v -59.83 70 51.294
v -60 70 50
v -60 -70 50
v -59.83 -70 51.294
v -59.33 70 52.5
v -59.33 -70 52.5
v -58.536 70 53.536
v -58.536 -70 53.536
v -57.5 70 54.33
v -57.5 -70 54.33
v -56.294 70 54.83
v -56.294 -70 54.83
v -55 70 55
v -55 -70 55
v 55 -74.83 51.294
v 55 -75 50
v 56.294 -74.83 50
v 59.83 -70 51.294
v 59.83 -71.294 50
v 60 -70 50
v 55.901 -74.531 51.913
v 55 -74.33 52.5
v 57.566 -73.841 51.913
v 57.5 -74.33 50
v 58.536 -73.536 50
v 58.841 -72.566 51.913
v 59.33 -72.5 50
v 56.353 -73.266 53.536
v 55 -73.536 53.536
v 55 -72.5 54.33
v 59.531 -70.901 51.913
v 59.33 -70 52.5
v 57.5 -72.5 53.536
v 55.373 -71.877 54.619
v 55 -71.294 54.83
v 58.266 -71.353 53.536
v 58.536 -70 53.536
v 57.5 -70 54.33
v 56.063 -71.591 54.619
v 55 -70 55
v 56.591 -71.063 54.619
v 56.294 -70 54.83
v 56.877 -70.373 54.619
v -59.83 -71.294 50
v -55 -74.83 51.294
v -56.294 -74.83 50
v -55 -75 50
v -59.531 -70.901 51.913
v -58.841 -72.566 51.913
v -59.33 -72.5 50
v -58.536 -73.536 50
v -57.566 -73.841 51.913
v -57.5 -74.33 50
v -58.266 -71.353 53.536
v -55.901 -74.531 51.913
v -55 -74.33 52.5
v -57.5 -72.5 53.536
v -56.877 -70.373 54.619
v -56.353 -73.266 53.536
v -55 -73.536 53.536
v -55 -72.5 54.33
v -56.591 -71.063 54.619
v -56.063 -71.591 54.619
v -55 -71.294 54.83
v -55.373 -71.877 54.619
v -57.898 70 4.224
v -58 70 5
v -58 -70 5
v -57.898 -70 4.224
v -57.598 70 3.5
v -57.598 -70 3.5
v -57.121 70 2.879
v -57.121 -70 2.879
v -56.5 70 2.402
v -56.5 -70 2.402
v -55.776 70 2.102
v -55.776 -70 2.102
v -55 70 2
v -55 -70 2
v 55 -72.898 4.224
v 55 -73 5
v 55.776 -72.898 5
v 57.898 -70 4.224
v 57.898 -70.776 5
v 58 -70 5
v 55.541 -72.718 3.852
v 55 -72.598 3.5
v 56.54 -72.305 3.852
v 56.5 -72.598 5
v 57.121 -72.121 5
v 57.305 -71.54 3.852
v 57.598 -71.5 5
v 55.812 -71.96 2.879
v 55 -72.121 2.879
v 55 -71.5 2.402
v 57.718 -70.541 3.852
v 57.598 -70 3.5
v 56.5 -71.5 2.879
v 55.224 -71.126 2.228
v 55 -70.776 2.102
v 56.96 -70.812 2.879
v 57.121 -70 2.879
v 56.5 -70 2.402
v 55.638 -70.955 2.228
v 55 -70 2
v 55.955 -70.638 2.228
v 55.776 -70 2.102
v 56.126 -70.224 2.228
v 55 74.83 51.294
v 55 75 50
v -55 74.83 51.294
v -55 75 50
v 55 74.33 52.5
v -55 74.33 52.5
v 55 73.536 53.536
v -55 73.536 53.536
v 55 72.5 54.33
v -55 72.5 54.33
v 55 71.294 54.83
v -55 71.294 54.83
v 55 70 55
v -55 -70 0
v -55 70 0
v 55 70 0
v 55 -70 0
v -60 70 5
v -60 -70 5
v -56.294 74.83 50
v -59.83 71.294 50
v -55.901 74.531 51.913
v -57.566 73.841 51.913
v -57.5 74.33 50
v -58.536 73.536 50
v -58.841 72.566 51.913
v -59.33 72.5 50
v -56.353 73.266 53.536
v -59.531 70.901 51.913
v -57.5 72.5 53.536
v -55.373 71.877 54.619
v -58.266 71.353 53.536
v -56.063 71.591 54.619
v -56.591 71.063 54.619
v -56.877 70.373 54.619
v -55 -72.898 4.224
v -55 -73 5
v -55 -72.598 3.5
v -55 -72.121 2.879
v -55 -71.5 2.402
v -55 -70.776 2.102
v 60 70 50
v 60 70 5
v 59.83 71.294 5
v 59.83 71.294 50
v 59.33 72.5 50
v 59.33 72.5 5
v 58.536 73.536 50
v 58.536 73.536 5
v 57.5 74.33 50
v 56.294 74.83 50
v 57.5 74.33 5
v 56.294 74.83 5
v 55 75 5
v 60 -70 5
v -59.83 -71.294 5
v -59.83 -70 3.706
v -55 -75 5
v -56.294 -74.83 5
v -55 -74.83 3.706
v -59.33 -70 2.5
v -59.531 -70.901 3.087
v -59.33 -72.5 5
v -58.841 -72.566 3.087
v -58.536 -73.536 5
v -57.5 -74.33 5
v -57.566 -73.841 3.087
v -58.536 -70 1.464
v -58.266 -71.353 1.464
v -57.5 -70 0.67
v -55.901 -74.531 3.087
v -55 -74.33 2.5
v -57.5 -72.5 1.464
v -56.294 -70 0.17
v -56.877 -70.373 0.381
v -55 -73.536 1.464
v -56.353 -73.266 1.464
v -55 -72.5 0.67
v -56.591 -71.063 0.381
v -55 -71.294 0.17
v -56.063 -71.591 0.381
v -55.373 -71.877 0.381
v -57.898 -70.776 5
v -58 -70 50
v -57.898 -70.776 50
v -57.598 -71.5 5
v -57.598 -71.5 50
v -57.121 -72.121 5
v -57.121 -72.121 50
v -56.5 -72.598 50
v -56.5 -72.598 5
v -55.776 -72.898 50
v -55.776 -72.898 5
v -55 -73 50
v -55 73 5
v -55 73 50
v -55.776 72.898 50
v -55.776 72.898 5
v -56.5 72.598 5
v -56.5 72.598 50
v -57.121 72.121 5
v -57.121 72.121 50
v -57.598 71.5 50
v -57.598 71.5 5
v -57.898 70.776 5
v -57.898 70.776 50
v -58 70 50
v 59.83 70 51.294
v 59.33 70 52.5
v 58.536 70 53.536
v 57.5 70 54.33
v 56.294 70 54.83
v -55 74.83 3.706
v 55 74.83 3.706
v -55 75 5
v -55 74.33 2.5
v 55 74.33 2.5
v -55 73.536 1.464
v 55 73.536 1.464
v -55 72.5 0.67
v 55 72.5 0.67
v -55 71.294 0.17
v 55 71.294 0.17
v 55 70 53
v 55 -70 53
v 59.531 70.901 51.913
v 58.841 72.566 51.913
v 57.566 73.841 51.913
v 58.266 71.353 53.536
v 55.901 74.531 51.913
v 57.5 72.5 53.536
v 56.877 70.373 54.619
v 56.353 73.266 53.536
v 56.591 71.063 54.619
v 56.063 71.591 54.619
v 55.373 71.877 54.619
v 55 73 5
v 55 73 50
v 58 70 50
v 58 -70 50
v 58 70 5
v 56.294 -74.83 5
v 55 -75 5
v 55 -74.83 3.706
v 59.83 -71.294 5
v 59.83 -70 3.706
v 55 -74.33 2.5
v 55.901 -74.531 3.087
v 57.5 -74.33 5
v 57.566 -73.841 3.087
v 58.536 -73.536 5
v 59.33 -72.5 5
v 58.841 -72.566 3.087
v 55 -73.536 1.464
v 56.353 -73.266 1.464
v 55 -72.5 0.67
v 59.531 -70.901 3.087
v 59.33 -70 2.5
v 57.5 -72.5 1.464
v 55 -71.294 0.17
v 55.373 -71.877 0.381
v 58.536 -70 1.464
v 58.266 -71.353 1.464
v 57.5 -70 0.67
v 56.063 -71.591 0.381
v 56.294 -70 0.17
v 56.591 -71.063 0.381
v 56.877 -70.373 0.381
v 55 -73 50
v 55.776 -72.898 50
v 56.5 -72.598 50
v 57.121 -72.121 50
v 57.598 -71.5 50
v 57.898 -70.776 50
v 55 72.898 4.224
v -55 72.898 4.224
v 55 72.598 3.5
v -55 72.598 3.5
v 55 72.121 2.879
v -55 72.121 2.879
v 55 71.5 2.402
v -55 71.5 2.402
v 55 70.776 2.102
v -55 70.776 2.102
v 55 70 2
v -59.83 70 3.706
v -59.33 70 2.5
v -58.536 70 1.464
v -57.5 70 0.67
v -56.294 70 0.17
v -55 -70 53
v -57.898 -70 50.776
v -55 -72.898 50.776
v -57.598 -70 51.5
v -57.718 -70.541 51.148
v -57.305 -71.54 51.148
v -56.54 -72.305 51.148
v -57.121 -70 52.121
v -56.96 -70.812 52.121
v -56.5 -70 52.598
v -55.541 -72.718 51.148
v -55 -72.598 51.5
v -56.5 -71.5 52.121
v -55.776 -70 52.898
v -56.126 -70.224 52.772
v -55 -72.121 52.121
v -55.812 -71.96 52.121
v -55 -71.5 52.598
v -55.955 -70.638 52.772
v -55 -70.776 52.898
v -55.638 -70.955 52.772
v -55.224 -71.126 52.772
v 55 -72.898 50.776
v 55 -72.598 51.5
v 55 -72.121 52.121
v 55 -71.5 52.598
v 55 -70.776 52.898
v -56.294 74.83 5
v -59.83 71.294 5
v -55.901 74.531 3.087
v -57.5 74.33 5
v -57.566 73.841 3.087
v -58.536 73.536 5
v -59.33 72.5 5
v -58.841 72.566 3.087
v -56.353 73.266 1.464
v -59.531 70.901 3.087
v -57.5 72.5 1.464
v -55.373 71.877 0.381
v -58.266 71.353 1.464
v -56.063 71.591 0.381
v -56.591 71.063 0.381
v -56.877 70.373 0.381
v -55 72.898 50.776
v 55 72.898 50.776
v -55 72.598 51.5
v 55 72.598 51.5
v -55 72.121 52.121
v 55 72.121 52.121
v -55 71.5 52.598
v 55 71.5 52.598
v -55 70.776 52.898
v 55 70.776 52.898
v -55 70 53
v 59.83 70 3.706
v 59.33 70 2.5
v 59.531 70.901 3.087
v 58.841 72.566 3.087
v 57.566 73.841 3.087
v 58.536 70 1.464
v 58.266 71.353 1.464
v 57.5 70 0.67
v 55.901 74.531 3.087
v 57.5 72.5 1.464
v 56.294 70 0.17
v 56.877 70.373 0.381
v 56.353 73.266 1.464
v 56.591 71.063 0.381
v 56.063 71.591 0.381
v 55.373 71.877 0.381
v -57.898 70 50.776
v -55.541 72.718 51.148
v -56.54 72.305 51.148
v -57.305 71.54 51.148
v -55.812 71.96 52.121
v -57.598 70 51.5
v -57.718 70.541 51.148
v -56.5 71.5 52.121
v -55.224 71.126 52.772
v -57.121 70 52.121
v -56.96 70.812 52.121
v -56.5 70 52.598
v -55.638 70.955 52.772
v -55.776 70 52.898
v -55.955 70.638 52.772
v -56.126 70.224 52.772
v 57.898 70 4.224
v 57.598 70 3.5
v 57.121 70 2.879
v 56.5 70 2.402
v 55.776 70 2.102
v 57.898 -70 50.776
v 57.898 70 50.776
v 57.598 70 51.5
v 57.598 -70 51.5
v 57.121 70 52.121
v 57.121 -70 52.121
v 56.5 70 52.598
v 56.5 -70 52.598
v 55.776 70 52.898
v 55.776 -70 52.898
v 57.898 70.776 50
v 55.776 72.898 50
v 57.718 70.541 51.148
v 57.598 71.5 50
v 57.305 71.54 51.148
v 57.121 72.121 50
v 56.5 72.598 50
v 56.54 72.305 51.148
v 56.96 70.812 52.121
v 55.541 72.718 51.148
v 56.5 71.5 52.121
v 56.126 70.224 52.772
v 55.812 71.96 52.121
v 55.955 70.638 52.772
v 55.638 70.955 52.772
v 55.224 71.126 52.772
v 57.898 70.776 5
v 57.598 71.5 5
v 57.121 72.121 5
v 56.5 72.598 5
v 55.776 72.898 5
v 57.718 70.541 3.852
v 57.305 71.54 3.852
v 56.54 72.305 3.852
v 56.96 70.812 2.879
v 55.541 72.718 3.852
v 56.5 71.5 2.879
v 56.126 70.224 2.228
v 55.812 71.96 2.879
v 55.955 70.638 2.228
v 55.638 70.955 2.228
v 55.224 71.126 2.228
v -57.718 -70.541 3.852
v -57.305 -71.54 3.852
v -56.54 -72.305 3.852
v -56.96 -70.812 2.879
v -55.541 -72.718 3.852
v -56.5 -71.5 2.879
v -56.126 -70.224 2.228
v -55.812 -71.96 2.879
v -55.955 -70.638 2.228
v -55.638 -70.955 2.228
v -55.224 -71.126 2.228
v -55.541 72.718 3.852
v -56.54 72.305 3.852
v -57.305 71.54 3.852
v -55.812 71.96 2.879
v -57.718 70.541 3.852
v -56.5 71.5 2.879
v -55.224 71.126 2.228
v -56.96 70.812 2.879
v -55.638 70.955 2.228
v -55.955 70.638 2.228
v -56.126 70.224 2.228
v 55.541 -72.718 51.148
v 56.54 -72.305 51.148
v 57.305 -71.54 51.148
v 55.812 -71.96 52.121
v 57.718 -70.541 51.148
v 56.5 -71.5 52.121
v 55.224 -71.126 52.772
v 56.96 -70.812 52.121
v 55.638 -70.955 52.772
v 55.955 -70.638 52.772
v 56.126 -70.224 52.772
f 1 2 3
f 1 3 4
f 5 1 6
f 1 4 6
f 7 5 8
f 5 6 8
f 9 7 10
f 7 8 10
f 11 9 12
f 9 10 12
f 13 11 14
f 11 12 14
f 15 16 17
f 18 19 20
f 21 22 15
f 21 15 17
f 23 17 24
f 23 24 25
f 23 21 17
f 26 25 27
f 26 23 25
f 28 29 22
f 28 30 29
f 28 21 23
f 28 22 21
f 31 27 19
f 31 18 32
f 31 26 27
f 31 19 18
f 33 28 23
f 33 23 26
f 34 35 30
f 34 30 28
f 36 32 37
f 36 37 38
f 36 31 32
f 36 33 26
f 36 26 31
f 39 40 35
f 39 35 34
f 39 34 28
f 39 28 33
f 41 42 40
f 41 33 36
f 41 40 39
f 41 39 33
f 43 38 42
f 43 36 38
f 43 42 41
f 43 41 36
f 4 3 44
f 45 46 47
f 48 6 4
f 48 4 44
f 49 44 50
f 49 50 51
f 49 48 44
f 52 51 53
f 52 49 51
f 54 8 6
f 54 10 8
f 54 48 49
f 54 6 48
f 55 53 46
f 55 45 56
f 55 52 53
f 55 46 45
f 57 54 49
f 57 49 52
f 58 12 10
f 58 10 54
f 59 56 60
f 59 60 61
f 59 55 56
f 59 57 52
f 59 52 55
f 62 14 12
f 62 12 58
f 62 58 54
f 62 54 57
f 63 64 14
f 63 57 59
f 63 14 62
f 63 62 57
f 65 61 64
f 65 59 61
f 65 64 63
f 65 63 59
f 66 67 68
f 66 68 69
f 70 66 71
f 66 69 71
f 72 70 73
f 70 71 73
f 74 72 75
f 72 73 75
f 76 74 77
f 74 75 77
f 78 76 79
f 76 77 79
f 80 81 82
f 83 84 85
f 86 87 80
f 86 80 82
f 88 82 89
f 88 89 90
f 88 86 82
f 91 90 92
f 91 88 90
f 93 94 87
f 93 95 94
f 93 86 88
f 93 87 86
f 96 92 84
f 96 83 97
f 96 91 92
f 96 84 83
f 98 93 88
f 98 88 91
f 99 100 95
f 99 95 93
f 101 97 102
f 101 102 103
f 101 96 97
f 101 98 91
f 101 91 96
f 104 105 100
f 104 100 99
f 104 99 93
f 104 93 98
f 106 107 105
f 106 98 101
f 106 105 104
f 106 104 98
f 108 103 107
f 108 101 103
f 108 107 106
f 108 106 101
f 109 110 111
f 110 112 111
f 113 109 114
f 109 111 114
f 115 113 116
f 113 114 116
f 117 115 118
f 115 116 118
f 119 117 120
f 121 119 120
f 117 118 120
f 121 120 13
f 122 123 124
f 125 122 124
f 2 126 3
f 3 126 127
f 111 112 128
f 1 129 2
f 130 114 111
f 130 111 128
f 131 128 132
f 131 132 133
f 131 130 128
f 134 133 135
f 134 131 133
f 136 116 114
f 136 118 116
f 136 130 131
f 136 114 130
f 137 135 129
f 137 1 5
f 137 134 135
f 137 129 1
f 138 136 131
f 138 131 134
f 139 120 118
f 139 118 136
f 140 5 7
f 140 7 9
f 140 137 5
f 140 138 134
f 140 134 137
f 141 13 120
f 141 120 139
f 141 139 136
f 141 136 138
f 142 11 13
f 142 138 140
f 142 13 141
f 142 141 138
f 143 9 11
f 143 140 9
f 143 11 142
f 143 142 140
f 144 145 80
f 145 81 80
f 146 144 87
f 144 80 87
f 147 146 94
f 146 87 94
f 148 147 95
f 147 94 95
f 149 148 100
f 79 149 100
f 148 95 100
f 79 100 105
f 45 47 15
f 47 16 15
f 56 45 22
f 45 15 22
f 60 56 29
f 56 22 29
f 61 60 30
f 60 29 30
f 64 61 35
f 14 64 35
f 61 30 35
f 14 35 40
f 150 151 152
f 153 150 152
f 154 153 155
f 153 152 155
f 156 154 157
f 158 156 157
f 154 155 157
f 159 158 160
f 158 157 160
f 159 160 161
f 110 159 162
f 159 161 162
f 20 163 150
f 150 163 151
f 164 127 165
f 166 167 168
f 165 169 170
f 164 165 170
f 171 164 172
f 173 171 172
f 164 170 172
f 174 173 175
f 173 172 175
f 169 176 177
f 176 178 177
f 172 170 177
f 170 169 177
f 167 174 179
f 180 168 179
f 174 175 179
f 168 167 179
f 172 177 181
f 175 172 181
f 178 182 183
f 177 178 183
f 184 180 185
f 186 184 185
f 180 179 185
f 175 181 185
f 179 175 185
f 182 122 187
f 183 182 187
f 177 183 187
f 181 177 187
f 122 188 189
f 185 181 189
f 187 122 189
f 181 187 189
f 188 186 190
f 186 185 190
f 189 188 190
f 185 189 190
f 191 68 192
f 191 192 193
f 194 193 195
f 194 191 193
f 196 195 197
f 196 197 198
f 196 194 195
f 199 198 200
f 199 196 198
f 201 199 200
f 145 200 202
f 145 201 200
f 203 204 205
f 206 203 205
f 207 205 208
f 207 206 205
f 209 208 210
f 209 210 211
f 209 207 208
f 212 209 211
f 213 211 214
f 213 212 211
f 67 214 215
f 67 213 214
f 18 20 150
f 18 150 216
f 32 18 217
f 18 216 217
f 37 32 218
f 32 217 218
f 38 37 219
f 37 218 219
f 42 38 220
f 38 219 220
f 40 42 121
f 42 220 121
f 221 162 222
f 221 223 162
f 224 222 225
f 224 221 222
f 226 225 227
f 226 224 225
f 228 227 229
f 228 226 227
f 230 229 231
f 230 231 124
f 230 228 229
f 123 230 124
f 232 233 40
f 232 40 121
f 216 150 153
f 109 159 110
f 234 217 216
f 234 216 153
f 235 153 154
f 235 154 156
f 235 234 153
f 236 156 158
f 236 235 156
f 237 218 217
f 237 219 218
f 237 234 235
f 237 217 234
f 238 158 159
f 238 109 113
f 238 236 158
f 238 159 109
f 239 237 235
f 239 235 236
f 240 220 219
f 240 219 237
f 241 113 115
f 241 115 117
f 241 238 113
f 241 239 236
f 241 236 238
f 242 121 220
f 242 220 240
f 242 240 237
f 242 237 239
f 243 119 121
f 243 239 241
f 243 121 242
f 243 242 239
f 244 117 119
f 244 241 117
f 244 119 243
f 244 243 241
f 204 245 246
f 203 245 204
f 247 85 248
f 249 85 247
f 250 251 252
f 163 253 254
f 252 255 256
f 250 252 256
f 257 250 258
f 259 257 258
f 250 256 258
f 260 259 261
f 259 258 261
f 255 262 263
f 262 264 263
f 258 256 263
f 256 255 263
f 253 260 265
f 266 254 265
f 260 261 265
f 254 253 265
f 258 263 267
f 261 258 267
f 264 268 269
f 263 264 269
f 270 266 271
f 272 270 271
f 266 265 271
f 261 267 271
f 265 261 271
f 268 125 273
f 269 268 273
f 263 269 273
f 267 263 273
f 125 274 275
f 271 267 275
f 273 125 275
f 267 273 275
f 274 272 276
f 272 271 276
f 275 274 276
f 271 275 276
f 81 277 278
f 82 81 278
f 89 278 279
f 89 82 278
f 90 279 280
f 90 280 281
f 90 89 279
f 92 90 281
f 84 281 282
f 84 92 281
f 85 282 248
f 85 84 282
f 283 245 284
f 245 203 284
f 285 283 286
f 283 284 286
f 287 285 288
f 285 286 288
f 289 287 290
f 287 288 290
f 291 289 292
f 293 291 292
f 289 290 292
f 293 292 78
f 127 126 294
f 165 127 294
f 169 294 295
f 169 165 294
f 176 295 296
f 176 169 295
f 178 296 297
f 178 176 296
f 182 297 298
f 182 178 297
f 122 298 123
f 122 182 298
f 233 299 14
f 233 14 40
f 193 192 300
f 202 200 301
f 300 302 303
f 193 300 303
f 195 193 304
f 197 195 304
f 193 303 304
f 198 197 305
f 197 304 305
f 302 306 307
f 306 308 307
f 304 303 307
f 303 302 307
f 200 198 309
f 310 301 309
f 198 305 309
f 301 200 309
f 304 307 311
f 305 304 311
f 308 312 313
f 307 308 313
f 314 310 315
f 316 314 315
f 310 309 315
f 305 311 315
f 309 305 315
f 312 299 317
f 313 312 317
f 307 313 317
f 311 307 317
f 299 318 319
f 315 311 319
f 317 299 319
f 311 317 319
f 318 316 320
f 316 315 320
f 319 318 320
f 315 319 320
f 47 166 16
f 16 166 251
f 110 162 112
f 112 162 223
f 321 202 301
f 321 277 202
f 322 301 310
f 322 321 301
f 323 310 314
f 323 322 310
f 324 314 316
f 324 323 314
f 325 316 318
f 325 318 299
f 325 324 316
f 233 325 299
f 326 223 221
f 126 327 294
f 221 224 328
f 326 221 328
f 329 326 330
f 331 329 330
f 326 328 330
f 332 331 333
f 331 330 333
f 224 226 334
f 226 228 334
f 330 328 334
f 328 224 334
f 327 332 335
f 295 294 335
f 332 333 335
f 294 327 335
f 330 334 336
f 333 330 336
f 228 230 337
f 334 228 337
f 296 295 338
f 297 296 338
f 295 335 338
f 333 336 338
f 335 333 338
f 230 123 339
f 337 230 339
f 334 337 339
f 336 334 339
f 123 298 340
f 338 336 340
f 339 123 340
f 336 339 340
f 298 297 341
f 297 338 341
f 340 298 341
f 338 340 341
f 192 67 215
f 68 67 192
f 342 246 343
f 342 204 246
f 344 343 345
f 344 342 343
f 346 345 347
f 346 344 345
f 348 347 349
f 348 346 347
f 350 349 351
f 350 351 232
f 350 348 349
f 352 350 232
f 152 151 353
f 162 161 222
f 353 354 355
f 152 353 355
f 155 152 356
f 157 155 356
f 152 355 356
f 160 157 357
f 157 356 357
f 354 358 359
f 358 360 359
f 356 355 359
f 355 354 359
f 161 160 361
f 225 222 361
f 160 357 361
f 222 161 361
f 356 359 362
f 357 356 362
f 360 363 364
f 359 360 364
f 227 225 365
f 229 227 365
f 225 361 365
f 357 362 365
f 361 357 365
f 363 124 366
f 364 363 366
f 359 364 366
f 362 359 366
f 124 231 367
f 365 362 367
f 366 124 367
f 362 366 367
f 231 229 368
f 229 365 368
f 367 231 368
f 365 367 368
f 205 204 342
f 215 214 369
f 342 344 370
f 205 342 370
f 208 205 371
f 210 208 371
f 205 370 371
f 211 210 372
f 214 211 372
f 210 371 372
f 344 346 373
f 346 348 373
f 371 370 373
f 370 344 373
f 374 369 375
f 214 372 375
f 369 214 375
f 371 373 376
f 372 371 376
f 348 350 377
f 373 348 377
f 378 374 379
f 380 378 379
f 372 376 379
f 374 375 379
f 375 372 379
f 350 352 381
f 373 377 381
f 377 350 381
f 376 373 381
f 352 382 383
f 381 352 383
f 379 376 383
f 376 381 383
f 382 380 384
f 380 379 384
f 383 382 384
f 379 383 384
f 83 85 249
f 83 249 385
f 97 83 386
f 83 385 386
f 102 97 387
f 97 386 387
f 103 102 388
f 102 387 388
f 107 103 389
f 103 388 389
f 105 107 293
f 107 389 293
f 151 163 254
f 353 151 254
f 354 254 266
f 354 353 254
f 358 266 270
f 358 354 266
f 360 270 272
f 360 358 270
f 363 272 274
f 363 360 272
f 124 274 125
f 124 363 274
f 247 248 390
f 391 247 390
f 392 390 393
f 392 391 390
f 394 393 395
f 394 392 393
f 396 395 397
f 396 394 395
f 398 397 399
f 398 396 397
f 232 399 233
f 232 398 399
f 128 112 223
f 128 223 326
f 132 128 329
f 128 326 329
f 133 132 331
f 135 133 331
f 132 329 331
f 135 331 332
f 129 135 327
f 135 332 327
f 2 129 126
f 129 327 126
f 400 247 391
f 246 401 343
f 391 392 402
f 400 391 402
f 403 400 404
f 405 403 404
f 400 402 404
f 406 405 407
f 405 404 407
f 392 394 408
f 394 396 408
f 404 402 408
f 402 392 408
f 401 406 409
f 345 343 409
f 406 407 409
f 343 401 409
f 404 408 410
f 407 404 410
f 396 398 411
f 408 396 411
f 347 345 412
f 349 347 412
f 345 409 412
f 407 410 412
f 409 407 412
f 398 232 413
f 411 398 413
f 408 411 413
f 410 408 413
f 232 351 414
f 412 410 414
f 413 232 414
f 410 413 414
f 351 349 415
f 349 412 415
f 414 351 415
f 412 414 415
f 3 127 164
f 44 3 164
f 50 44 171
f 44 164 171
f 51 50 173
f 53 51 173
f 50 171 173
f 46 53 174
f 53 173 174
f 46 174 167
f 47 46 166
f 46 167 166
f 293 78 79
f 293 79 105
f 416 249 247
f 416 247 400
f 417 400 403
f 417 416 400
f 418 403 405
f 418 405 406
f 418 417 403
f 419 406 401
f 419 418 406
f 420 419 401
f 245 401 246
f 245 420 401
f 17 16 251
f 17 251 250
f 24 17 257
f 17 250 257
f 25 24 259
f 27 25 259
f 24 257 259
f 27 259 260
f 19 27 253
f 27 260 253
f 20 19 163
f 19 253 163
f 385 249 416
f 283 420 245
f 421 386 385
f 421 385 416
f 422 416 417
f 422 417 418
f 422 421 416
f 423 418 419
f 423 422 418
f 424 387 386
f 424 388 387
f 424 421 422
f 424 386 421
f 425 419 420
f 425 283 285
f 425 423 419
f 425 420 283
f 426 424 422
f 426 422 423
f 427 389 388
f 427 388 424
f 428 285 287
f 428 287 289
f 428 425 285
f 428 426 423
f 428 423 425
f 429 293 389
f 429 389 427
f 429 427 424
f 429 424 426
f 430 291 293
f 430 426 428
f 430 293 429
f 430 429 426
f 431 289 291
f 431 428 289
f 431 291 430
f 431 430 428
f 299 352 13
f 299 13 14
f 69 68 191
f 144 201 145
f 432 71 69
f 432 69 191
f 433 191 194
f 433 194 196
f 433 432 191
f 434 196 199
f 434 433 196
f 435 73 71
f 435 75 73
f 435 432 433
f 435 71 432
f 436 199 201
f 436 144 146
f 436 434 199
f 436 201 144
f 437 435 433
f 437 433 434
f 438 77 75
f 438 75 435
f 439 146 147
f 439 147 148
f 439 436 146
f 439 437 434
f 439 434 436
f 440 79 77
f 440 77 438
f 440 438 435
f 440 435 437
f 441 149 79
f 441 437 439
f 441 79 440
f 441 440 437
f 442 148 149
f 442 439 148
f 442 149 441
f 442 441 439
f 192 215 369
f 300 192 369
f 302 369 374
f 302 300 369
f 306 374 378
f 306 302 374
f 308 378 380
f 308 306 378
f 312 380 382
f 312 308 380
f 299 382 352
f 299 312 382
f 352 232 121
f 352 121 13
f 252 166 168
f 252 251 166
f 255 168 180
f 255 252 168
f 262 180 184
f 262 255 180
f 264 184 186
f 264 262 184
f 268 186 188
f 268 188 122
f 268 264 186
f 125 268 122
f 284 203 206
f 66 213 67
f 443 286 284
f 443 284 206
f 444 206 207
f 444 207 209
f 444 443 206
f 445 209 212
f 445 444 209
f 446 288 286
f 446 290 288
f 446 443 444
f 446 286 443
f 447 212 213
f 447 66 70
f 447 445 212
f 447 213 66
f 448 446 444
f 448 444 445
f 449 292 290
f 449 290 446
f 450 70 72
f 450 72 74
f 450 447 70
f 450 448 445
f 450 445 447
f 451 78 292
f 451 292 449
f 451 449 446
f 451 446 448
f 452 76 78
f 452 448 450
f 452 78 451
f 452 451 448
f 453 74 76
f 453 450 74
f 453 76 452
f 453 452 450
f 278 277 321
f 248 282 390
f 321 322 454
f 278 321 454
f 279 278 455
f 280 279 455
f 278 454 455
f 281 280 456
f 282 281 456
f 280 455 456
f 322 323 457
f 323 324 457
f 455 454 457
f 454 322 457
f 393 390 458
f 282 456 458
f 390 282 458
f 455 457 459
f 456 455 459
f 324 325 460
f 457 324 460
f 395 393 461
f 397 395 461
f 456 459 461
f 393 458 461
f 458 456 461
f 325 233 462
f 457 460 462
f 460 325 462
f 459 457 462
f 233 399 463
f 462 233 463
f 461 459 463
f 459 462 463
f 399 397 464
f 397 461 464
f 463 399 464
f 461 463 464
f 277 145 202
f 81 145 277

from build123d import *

# Parameters (mm, degrees)
F1_DEPTH = 55
F2_R     = 5
F3_T     = -2


# Not quite as in the source:
# - a shell that OpenCascade refuses in one call is made with other operations: the cavity is built on its own and cut out


with BuildPart() as f1:
    # F0 (on Top) → F1 (new body)
    with BuildSketch(Plane.XY):
        with BuildLine():
            Line((-55, -75), (55, -75))
            ThreePointArc((55, -75), (58.5355339059, -73.5355339059), (60, -70))
            Line((60, -70), (60, 70))
            ThreePointArc((60, 70), (58.5355339059, 73.5355339059), (55, 75))
            Line((55, 75), (-55, 75))
            ThreePointArc((-55, 75), (-58.5355339059, 73.5355339059), (-60, 70))
            Line((-60, 70), (-60, -70))
            ThreePointArc((-60, -70), (-58.5355339059, -73.5355339059), (-55, -75))
        make_face()
    extrude(amount=F1_DEPTH)

    # F2
    f2_edges = [f1.edges().sort_by_distance(p)[0] for p in [
        (-60, 0, 55),
        (-60, 0, 0),
    ]]
    fillet(f2_edges, radius=F2_R)

    # F3: a shell. OpenCascade refuses it in one call, so the cavity is built on its own and cut out:
    # the body offset inwards by the wall thickness, plus a prism from it out through each open face.
    f3_core = offset(f1.part, amount=F3_T, mode=Mode.PRIVATE)
    f3_exits = [f3_core.faces().sort_by_distance(p)[0] for p in [
        (0, 0, 53),
    ]]
    add(f3_core, mode=Mode.SUBTRACT)
    extrude(f3_exits, amount=-F3_T, mode=Mode.SUBTRACT)


solid = f1.part
